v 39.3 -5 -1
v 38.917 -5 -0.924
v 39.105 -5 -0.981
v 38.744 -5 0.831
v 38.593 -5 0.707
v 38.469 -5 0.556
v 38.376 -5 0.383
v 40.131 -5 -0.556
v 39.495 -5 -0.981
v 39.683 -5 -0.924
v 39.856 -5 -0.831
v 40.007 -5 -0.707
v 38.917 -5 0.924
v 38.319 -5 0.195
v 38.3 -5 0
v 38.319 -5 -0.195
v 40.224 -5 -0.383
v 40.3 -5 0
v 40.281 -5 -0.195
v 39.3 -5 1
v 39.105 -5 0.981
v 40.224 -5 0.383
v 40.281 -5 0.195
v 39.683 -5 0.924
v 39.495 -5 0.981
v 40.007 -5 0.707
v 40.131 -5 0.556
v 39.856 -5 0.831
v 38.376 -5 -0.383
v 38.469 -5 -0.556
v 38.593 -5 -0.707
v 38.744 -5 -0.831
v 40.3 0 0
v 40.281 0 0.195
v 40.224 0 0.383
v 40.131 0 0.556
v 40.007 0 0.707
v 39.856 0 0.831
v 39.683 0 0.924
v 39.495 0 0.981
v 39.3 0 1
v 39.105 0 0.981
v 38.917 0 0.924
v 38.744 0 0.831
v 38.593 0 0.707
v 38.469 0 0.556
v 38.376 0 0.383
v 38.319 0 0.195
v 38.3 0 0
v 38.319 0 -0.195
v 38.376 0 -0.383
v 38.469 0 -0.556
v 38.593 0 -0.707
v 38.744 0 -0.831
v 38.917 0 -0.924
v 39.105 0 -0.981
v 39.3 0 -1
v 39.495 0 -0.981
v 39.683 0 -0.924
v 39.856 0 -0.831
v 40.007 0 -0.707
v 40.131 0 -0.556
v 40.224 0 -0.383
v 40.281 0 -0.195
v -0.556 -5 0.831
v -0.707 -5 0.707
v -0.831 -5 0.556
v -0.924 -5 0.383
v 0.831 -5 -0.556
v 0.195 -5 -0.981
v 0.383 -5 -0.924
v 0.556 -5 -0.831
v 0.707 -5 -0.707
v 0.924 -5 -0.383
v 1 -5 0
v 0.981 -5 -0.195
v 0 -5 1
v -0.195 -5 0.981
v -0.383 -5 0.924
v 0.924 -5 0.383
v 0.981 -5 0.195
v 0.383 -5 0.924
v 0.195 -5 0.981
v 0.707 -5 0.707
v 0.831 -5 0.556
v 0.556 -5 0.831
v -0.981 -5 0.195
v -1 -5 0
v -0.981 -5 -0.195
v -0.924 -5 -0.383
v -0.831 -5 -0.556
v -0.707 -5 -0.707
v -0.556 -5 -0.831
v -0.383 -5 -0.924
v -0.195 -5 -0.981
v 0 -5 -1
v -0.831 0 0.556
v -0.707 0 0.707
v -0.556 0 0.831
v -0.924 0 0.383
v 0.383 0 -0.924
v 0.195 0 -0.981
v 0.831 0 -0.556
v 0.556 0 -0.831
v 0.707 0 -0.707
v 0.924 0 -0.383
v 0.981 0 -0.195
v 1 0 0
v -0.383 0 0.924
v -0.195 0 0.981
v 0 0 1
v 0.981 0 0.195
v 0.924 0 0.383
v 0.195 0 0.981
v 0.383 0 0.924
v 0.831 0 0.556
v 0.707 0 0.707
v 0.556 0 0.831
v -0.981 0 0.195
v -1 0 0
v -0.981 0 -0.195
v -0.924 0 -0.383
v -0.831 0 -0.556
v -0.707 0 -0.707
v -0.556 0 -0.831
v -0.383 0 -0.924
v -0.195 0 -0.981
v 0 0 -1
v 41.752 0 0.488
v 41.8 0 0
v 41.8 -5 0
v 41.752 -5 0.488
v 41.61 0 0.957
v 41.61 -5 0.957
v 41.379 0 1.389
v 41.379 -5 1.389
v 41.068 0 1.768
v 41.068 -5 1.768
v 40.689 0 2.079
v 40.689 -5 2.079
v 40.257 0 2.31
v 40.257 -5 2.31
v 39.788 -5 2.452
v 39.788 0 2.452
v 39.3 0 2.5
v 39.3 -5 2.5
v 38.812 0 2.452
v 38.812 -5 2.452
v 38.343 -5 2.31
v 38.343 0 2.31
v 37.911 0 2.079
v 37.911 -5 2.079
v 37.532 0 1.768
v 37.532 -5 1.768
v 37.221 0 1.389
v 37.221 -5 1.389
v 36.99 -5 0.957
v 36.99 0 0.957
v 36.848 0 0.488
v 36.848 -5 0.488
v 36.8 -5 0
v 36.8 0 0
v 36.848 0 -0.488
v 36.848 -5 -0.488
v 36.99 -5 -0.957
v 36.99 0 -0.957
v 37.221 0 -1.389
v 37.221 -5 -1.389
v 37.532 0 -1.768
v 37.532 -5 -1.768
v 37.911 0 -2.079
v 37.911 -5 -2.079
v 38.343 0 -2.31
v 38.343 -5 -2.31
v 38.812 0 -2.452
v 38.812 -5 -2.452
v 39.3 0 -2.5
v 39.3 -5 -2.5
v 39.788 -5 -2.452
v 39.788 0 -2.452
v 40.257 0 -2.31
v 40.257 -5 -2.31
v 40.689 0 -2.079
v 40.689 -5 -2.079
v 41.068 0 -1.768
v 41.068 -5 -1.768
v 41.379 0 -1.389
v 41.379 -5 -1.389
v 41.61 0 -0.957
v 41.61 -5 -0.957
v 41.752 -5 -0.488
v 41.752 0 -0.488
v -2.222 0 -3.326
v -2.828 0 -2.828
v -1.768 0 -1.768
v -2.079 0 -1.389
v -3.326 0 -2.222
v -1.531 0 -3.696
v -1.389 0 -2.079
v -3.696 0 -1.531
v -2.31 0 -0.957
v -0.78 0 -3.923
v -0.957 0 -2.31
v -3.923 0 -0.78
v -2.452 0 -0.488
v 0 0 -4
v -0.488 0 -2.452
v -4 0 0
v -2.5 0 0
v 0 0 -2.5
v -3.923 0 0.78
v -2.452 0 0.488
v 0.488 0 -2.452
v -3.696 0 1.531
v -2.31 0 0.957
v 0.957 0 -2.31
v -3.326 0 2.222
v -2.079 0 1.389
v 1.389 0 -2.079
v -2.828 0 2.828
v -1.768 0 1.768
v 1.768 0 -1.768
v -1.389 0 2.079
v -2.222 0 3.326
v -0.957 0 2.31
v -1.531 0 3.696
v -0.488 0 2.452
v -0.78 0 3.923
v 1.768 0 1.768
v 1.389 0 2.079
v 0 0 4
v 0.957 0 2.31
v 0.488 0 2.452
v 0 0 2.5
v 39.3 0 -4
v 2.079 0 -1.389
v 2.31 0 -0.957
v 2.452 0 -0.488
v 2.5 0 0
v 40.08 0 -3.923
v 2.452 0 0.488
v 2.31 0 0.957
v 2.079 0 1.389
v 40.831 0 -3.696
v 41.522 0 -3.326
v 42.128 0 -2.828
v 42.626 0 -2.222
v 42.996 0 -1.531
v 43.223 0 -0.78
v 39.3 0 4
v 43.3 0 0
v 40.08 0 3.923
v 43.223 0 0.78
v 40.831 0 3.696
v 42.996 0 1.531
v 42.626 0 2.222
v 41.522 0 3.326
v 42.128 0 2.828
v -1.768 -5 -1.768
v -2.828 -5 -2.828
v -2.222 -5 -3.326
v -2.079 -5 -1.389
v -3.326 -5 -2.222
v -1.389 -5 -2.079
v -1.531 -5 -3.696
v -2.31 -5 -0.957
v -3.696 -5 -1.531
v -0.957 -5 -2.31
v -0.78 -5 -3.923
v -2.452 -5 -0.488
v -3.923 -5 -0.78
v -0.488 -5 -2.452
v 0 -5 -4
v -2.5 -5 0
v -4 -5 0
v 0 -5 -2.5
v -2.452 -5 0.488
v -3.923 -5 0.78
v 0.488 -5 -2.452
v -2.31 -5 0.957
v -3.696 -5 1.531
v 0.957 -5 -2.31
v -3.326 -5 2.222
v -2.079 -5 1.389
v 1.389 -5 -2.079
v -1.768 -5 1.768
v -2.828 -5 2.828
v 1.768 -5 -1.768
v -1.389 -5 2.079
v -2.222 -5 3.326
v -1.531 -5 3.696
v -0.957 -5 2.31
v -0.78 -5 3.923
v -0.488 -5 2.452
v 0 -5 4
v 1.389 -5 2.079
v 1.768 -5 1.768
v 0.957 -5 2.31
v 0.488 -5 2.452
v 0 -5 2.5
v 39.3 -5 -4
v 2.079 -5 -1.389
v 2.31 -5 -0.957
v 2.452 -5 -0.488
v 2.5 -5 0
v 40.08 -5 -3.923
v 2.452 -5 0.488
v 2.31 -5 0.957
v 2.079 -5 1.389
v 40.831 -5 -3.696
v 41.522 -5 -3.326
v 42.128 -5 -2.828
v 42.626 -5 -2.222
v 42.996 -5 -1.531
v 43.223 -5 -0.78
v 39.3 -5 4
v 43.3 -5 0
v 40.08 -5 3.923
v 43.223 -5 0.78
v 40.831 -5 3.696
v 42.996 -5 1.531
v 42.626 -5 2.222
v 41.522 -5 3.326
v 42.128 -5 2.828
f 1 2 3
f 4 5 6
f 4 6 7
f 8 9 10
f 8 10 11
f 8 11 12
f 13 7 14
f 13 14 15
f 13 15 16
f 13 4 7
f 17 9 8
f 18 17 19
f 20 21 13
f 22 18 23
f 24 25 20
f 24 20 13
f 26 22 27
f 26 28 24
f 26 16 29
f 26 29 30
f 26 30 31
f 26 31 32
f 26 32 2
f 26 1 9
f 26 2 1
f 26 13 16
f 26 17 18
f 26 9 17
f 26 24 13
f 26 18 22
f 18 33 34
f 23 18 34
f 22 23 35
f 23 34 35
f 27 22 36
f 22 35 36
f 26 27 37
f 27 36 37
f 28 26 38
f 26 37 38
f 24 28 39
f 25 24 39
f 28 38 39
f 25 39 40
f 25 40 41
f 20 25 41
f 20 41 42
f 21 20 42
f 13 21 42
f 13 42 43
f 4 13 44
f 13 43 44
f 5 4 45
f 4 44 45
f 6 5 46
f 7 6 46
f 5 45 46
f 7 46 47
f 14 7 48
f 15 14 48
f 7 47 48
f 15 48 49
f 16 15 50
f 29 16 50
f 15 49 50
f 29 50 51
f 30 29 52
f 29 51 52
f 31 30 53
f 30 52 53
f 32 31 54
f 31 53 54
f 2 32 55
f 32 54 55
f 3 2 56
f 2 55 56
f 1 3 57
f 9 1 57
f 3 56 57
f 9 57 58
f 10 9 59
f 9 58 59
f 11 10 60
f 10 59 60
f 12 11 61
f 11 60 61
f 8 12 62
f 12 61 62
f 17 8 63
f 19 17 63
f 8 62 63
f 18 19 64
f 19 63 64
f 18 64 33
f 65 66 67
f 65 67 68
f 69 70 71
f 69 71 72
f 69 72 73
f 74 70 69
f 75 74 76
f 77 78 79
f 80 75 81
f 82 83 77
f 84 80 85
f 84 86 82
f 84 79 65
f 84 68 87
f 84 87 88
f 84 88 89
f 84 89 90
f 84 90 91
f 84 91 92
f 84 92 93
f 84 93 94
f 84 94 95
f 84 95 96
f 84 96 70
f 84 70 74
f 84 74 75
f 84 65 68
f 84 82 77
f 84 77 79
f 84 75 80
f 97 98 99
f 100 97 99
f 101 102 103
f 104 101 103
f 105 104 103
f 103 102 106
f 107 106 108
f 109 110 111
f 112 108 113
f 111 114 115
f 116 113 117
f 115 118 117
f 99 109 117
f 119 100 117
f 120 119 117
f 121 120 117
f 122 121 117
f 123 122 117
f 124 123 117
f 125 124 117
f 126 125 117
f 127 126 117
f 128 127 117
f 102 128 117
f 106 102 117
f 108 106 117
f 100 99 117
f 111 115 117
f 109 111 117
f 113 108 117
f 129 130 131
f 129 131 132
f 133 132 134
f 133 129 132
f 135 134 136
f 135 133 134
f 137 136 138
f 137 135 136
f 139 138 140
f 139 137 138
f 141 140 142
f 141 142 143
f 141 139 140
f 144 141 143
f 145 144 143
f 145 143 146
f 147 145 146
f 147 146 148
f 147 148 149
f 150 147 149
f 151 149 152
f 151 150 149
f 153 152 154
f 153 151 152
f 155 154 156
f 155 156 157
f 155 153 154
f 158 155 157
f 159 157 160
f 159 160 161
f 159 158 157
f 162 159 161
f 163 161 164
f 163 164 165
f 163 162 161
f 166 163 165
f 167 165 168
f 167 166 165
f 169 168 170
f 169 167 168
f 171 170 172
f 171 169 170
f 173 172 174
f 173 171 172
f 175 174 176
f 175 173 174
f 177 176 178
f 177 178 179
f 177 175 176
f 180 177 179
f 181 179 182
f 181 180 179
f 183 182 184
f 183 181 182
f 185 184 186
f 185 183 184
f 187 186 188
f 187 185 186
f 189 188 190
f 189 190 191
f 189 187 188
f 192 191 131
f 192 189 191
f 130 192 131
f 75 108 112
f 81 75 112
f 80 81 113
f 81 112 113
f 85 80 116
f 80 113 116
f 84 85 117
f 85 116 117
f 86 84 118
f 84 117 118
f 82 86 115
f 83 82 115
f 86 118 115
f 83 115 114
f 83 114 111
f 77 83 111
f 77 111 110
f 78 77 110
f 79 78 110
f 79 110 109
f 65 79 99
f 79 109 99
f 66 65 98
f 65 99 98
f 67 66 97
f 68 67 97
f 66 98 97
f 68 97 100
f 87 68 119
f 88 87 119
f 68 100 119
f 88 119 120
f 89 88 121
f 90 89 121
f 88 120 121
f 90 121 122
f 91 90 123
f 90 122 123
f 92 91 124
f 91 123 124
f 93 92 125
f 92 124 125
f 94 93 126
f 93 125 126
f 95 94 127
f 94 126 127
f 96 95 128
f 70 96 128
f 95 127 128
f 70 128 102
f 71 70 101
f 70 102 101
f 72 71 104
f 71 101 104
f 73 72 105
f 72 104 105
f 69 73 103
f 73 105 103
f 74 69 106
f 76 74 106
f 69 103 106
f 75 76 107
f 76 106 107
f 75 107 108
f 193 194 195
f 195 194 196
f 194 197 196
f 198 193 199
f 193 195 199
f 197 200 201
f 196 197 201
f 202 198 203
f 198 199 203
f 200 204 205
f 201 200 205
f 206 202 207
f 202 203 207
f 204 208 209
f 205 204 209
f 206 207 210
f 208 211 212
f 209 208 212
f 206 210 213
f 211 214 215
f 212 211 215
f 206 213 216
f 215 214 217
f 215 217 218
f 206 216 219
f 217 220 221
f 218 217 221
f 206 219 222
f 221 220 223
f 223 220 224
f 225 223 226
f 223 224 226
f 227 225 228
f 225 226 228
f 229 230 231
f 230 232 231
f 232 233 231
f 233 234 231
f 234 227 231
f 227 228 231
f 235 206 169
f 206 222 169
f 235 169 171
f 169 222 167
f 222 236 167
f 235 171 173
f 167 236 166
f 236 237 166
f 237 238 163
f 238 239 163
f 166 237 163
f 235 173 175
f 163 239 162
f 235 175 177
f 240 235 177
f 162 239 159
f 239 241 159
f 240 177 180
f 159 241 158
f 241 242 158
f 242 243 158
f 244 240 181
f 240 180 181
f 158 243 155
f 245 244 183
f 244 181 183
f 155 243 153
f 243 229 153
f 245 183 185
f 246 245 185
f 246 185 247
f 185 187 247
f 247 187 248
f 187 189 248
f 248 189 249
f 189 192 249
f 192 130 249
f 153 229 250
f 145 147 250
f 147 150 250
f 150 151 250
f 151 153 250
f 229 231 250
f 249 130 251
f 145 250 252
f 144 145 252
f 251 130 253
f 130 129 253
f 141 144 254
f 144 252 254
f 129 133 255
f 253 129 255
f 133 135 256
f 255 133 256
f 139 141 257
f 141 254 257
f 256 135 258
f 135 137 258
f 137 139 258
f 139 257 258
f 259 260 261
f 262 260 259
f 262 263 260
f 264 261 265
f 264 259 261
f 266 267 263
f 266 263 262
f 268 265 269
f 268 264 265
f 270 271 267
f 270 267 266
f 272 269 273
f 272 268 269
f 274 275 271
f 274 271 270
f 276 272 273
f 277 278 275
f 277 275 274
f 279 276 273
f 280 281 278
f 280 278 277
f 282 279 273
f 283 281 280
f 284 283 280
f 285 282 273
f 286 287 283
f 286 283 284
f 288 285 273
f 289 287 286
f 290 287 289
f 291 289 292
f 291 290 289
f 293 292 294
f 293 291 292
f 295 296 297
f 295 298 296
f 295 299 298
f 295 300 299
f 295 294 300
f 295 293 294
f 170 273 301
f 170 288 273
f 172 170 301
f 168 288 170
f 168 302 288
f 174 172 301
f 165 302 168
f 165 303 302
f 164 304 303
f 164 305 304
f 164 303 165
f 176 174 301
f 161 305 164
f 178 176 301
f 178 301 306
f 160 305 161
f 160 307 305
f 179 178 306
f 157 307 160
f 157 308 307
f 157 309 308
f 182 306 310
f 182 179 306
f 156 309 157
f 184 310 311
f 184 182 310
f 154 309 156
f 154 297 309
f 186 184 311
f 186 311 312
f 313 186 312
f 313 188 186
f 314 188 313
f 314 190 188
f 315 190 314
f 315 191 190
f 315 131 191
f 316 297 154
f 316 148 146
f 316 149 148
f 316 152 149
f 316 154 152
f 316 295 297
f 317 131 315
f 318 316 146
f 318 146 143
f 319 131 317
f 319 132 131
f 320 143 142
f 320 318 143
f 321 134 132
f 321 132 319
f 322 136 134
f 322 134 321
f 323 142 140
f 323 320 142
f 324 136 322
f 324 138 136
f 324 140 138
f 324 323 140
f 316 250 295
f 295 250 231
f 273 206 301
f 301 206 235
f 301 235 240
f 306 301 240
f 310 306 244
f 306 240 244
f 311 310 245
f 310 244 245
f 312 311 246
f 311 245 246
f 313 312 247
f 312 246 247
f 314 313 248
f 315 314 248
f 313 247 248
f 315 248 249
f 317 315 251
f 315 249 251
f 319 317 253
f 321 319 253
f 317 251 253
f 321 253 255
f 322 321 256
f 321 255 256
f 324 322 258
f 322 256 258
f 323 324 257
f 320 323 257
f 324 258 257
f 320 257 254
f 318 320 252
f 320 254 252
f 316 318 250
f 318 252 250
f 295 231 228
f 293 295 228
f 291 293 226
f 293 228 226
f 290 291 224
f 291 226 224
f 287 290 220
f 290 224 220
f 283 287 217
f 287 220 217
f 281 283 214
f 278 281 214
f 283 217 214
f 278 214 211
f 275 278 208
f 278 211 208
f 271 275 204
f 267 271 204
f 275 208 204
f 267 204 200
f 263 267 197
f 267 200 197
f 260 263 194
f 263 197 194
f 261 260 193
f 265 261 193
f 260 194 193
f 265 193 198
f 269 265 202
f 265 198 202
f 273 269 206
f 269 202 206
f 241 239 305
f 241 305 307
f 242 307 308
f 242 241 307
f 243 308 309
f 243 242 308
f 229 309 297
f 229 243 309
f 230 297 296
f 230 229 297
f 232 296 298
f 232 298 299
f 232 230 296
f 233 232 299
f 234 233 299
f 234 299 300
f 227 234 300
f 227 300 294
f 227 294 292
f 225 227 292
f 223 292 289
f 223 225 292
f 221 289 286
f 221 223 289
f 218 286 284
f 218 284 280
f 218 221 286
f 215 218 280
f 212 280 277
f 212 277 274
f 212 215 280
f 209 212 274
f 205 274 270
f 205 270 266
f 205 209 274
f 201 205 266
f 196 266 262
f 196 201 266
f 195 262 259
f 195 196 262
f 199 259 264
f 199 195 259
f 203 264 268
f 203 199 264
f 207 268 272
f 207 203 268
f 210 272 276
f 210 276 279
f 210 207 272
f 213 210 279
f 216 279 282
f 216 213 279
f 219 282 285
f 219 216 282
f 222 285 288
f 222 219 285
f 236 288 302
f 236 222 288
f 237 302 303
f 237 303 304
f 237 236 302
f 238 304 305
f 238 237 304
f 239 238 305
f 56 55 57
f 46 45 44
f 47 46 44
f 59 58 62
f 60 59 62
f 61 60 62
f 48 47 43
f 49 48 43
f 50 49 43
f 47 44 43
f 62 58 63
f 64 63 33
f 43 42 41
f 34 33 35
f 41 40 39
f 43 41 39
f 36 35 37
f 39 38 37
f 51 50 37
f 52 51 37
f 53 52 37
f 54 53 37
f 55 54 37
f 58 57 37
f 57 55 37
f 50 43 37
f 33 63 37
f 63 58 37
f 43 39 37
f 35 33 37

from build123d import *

# Parameters (mm, degrees)
F0_R     = 2.5
F0_R_2   = 1
F1_DEPTH = 5


with BuildPart() as f1:
    # F0 (on Front) → F1 (new body)
    with BuildSketch(Plane.XZ):
        with BuildLine():
            ThreePointArc((0, 4), (-4, 0), (0, -4))
            Line((0, -4), (39.3, -4))
            ThreePointArc((39.3, -4), (43.3, 0), (39.3, 4))
            Line((39.3, 4), (0, 4))
        make_face()
        Circle(F0_R, mode=Mode.SUBTRACT)
        with Locations((39.3, 0)):
            Circle(F0_R, mode=Mode.SUBTRACT)
        Circle(F0_R_2)
        with Locations((39.3, 0)):
            Circle(F0_R_2)
    extrude(amount=F1_DEPTH)


solid = f1.part
